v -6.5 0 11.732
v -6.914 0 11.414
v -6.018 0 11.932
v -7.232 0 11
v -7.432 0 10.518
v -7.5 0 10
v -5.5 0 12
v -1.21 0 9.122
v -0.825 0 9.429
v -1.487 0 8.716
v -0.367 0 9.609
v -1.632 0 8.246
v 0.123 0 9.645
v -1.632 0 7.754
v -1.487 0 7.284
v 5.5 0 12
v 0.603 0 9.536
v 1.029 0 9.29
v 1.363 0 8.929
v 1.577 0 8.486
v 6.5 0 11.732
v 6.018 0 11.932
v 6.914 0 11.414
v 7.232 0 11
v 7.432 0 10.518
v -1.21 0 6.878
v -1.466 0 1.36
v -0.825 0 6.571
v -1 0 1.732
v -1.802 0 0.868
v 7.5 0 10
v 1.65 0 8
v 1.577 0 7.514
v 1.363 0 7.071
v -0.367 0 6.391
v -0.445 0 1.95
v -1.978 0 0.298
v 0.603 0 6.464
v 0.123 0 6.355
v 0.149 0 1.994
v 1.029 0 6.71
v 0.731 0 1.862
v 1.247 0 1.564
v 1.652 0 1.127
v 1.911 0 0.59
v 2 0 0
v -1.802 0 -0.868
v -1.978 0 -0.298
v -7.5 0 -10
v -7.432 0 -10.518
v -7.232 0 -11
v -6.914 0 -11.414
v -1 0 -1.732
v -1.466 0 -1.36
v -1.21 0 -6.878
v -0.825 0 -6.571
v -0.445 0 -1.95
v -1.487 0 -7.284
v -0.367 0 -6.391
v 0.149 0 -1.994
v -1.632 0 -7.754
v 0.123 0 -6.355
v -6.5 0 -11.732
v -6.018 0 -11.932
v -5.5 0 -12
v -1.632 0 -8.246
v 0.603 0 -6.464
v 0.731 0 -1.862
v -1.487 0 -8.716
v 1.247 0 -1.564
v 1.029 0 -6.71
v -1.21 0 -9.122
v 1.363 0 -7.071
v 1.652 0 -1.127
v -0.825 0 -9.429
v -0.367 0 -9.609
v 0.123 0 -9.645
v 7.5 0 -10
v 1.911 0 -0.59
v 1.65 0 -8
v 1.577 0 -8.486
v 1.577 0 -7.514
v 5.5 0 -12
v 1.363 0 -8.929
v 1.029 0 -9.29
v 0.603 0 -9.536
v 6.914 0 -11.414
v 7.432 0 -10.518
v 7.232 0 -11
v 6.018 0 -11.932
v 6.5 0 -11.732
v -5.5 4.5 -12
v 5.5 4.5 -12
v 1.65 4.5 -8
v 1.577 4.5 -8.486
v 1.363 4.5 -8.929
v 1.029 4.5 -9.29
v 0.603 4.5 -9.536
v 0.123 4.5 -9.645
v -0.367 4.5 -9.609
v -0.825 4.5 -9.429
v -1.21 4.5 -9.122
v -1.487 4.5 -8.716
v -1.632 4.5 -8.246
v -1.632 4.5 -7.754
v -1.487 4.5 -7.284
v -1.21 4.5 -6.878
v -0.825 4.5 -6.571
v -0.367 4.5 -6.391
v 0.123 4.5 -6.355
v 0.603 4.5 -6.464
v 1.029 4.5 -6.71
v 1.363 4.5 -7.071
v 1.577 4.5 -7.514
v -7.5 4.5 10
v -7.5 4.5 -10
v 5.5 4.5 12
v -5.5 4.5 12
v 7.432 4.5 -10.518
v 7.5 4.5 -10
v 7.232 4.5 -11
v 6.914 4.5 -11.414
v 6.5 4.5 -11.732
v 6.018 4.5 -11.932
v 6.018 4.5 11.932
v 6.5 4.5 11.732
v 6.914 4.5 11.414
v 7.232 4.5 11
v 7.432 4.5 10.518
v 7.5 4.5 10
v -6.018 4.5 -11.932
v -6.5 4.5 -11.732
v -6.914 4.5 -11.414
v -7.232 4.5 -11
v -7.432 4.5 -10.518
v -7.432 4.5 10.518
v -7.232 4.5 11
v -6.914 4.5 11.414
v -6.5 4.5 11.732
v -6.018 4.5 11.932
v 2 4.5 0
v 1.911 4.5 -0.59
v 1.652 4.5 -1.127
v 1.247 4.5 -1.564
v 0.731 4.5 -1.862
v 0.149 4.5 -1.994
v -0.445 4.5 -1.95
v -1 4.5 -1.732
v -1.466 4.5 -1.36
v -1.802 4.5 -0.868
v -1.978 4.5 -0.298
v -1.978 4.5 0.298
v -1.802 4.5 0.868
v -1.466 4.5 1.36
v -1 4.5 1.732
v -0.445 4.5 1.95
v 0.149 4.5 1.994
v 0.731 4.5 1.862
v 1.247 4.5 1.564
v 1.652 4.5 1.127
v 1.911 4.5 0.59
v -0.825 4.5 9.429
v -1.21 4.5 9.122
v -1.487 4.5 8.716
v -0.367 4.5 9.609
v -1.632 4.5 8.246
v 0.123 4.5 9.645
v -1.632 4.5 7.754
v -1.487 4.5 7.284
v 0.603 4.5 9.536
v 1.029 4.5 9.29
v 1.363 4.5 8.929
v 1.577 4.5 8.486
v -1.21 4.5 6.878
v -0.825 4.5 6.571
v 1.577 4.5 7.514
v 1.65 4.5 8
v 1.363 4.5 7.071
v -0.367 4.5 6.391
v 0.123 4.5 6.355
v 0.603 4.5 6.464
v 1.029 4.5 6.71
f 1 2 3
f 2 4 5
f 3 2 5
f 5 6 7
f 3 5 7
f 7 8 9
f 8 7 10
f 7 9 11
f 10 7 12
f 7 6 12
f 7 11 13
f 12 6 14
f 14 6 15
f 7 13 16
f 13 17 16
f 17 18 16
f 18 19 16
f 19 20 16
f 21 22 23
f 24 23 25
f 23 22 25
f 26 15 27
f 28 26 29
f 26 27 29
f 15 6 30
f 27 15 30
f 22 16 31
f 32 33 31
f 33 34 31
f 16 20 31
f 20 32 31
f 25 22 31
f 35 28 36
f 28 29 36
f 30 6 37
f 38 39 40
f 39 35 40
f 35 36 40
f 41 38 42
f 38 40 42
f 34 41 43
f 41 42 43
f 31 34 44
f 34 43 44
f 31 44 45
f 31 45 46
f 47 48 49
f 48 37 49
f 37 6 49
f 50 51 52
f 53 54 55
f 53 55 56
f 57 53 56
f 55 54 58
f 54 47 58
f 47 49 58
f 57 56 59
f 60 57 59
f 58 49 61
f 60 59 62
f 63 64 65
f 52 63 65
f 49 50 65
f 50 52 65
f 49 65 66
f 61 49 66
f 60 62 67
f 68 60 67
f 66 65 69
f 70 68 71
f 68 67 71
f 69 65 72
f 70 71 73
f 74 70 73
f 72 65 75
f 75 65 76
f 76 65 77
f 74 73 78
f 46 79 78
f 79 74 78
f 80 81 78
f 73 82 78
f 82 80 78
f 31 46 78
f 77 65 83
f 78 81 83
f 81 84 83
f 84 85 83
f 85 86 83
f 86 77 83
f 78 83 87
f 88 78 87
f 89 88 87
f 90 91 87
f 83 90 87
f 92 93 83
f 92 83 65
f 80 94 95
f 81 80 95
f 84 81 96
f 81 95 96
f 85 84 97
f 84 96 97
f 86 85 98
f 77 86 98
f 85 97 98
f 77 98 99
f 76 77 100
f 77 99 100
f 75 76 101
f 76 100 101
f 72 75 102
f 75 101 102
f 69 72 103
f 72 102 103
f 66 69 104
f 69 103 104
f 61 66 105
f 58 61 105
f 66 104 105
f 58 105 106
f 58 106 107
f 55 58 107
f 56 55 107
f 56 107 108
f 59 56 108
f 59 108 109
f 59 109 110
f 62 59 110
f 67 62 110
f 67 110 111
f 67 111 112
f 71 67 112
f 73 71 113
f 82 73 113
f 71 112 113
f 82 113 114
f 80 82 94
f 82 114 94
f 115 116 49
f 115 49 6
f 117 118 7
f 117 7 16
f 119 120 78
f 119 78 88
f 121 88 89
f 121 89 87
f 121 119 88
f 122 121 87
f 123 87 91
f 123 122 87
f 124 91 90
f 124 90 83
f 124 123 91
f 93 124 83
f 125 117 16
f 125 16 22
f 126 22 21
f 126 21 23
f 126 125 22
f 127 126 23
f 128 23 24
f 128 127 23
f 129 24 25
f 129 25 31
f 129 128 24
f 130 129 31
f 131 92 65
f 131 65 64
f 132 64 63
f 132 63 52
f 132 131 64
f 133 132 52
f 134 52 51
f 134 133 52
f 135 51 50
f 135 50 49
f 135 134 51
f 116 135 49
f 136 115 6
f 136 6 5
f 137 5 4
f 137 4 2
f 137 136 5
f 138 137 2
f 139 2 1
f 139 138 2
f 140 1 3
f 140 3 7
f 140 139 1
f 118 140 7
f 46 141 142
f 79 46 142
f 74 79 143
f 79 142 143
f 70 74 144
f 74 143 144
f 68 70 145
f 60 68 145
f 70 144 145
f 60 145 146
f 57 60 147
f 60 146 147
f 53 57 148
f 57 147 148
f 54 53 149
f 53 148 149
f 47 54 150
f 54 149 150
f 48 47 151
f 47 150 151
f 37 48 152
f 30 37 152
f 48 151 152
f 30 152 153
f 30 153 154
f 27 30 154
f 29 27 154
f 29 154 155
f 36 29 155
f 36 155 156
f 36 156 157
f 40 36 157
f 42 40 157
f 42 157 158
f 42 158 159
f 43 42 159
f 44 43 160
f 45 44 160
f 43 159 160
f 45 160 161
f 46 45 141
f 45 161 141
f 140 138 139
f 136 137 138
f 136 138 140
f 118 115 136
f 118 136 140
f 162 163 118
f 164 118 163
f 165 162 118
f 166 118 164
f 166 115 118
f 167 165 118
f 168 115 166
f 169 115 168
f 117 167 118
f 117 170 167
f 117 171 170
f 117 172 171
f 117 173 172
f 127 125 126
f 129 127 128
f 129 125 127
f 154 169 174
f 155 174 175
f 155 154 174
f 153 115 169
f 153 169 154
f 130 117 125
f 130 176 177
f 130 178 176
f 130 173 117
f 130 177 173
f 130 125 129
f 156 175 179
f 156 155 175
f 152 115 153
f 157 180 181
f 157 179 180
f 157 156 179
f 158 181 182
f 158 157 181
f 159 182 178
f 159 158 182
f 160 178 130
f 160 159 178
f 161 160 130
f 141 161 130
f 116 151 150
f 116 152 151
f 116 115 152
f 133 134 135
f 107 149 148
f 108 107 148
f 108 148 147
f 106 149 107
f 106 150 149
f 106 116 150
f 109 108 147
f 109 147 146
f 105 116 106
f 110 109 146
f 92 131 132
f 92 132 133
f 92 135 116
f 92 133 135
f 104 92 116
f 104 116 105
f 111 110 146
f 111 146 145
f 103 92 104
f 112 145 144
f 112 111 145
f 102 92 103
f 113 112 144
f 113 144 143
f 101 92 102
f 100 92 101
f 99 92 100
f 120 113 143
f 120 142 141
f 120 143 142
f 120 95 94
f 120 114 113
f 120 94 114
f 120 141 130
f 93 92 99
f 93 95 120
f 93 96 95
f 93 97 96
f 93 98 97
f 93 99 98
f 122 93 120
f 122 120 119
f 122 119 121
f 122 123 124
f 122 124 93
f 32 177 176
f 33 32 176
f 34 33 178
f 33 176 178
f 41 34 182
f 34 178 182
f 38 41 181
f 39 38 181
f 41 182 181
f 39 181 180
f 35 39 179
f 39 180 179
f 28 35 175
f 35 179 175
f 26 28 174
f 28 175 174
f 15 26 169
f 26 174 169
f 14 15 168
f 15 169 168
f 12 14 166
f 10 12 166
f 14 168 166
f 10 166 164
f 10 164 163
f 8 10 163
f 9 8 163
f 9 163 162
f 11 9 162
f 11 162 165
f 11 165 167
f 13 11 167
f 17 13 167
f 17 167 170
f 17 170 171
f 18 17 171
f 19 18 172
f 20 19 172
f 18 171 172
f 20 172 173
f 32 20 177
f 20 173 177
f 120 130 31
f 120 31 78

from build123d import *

# Parameters (mm, degrees)
SKETCH1_R           = 2
SKETCH1_R_2         = 1.65
BOSS_EXTRUDE1_DEPTH = 4.5


with BuildPart() as part:
    # Sketch1 → Boss-Extrude1 (new body)
    with BuildSketch(Plane(origin=(0, 4.5, 0), x_dir=(1, 0, 0), z_dir=(0, 1, 0))):
        with BuildLine():
            Line((5.5, 12), (-5.5, 12))
            ThreePointArc((-5.5, 12), (-6.914213562, 11.414213562), (-7.5, 10))
            Line((-7.5, 10), (-7.5, -10))
            ThreePointArc((-7.5, -10), (-6.914213562, -11.414213562), (-5.5, -12))
            Line((-5.5, -12), (5.5, -12))
            ThreePointArc((5.5, -12), (6.914213562, -11.414213562), (7.5, -10))
            Line((7.5, -10), (7.5, 10))
            ThreePointArc((7.5, 10), (6.914213562, 11.414213562), (5.5, 12))
        make_face()
        Circle(SKETCH1_R, mode=Mode.SUBTRACT)
        with Locations((0, -8)):
            Circle(SKETCH1_R_2, mode=Mode.SUBTRACT)
        with Locations((0, 8)):
            Circle(SKETCH1_R_2, mode=Mode.SUBTRACT)
    extrude(amount=-BOSS_EXTRUDE1_DEPTH)


solid = part.part
